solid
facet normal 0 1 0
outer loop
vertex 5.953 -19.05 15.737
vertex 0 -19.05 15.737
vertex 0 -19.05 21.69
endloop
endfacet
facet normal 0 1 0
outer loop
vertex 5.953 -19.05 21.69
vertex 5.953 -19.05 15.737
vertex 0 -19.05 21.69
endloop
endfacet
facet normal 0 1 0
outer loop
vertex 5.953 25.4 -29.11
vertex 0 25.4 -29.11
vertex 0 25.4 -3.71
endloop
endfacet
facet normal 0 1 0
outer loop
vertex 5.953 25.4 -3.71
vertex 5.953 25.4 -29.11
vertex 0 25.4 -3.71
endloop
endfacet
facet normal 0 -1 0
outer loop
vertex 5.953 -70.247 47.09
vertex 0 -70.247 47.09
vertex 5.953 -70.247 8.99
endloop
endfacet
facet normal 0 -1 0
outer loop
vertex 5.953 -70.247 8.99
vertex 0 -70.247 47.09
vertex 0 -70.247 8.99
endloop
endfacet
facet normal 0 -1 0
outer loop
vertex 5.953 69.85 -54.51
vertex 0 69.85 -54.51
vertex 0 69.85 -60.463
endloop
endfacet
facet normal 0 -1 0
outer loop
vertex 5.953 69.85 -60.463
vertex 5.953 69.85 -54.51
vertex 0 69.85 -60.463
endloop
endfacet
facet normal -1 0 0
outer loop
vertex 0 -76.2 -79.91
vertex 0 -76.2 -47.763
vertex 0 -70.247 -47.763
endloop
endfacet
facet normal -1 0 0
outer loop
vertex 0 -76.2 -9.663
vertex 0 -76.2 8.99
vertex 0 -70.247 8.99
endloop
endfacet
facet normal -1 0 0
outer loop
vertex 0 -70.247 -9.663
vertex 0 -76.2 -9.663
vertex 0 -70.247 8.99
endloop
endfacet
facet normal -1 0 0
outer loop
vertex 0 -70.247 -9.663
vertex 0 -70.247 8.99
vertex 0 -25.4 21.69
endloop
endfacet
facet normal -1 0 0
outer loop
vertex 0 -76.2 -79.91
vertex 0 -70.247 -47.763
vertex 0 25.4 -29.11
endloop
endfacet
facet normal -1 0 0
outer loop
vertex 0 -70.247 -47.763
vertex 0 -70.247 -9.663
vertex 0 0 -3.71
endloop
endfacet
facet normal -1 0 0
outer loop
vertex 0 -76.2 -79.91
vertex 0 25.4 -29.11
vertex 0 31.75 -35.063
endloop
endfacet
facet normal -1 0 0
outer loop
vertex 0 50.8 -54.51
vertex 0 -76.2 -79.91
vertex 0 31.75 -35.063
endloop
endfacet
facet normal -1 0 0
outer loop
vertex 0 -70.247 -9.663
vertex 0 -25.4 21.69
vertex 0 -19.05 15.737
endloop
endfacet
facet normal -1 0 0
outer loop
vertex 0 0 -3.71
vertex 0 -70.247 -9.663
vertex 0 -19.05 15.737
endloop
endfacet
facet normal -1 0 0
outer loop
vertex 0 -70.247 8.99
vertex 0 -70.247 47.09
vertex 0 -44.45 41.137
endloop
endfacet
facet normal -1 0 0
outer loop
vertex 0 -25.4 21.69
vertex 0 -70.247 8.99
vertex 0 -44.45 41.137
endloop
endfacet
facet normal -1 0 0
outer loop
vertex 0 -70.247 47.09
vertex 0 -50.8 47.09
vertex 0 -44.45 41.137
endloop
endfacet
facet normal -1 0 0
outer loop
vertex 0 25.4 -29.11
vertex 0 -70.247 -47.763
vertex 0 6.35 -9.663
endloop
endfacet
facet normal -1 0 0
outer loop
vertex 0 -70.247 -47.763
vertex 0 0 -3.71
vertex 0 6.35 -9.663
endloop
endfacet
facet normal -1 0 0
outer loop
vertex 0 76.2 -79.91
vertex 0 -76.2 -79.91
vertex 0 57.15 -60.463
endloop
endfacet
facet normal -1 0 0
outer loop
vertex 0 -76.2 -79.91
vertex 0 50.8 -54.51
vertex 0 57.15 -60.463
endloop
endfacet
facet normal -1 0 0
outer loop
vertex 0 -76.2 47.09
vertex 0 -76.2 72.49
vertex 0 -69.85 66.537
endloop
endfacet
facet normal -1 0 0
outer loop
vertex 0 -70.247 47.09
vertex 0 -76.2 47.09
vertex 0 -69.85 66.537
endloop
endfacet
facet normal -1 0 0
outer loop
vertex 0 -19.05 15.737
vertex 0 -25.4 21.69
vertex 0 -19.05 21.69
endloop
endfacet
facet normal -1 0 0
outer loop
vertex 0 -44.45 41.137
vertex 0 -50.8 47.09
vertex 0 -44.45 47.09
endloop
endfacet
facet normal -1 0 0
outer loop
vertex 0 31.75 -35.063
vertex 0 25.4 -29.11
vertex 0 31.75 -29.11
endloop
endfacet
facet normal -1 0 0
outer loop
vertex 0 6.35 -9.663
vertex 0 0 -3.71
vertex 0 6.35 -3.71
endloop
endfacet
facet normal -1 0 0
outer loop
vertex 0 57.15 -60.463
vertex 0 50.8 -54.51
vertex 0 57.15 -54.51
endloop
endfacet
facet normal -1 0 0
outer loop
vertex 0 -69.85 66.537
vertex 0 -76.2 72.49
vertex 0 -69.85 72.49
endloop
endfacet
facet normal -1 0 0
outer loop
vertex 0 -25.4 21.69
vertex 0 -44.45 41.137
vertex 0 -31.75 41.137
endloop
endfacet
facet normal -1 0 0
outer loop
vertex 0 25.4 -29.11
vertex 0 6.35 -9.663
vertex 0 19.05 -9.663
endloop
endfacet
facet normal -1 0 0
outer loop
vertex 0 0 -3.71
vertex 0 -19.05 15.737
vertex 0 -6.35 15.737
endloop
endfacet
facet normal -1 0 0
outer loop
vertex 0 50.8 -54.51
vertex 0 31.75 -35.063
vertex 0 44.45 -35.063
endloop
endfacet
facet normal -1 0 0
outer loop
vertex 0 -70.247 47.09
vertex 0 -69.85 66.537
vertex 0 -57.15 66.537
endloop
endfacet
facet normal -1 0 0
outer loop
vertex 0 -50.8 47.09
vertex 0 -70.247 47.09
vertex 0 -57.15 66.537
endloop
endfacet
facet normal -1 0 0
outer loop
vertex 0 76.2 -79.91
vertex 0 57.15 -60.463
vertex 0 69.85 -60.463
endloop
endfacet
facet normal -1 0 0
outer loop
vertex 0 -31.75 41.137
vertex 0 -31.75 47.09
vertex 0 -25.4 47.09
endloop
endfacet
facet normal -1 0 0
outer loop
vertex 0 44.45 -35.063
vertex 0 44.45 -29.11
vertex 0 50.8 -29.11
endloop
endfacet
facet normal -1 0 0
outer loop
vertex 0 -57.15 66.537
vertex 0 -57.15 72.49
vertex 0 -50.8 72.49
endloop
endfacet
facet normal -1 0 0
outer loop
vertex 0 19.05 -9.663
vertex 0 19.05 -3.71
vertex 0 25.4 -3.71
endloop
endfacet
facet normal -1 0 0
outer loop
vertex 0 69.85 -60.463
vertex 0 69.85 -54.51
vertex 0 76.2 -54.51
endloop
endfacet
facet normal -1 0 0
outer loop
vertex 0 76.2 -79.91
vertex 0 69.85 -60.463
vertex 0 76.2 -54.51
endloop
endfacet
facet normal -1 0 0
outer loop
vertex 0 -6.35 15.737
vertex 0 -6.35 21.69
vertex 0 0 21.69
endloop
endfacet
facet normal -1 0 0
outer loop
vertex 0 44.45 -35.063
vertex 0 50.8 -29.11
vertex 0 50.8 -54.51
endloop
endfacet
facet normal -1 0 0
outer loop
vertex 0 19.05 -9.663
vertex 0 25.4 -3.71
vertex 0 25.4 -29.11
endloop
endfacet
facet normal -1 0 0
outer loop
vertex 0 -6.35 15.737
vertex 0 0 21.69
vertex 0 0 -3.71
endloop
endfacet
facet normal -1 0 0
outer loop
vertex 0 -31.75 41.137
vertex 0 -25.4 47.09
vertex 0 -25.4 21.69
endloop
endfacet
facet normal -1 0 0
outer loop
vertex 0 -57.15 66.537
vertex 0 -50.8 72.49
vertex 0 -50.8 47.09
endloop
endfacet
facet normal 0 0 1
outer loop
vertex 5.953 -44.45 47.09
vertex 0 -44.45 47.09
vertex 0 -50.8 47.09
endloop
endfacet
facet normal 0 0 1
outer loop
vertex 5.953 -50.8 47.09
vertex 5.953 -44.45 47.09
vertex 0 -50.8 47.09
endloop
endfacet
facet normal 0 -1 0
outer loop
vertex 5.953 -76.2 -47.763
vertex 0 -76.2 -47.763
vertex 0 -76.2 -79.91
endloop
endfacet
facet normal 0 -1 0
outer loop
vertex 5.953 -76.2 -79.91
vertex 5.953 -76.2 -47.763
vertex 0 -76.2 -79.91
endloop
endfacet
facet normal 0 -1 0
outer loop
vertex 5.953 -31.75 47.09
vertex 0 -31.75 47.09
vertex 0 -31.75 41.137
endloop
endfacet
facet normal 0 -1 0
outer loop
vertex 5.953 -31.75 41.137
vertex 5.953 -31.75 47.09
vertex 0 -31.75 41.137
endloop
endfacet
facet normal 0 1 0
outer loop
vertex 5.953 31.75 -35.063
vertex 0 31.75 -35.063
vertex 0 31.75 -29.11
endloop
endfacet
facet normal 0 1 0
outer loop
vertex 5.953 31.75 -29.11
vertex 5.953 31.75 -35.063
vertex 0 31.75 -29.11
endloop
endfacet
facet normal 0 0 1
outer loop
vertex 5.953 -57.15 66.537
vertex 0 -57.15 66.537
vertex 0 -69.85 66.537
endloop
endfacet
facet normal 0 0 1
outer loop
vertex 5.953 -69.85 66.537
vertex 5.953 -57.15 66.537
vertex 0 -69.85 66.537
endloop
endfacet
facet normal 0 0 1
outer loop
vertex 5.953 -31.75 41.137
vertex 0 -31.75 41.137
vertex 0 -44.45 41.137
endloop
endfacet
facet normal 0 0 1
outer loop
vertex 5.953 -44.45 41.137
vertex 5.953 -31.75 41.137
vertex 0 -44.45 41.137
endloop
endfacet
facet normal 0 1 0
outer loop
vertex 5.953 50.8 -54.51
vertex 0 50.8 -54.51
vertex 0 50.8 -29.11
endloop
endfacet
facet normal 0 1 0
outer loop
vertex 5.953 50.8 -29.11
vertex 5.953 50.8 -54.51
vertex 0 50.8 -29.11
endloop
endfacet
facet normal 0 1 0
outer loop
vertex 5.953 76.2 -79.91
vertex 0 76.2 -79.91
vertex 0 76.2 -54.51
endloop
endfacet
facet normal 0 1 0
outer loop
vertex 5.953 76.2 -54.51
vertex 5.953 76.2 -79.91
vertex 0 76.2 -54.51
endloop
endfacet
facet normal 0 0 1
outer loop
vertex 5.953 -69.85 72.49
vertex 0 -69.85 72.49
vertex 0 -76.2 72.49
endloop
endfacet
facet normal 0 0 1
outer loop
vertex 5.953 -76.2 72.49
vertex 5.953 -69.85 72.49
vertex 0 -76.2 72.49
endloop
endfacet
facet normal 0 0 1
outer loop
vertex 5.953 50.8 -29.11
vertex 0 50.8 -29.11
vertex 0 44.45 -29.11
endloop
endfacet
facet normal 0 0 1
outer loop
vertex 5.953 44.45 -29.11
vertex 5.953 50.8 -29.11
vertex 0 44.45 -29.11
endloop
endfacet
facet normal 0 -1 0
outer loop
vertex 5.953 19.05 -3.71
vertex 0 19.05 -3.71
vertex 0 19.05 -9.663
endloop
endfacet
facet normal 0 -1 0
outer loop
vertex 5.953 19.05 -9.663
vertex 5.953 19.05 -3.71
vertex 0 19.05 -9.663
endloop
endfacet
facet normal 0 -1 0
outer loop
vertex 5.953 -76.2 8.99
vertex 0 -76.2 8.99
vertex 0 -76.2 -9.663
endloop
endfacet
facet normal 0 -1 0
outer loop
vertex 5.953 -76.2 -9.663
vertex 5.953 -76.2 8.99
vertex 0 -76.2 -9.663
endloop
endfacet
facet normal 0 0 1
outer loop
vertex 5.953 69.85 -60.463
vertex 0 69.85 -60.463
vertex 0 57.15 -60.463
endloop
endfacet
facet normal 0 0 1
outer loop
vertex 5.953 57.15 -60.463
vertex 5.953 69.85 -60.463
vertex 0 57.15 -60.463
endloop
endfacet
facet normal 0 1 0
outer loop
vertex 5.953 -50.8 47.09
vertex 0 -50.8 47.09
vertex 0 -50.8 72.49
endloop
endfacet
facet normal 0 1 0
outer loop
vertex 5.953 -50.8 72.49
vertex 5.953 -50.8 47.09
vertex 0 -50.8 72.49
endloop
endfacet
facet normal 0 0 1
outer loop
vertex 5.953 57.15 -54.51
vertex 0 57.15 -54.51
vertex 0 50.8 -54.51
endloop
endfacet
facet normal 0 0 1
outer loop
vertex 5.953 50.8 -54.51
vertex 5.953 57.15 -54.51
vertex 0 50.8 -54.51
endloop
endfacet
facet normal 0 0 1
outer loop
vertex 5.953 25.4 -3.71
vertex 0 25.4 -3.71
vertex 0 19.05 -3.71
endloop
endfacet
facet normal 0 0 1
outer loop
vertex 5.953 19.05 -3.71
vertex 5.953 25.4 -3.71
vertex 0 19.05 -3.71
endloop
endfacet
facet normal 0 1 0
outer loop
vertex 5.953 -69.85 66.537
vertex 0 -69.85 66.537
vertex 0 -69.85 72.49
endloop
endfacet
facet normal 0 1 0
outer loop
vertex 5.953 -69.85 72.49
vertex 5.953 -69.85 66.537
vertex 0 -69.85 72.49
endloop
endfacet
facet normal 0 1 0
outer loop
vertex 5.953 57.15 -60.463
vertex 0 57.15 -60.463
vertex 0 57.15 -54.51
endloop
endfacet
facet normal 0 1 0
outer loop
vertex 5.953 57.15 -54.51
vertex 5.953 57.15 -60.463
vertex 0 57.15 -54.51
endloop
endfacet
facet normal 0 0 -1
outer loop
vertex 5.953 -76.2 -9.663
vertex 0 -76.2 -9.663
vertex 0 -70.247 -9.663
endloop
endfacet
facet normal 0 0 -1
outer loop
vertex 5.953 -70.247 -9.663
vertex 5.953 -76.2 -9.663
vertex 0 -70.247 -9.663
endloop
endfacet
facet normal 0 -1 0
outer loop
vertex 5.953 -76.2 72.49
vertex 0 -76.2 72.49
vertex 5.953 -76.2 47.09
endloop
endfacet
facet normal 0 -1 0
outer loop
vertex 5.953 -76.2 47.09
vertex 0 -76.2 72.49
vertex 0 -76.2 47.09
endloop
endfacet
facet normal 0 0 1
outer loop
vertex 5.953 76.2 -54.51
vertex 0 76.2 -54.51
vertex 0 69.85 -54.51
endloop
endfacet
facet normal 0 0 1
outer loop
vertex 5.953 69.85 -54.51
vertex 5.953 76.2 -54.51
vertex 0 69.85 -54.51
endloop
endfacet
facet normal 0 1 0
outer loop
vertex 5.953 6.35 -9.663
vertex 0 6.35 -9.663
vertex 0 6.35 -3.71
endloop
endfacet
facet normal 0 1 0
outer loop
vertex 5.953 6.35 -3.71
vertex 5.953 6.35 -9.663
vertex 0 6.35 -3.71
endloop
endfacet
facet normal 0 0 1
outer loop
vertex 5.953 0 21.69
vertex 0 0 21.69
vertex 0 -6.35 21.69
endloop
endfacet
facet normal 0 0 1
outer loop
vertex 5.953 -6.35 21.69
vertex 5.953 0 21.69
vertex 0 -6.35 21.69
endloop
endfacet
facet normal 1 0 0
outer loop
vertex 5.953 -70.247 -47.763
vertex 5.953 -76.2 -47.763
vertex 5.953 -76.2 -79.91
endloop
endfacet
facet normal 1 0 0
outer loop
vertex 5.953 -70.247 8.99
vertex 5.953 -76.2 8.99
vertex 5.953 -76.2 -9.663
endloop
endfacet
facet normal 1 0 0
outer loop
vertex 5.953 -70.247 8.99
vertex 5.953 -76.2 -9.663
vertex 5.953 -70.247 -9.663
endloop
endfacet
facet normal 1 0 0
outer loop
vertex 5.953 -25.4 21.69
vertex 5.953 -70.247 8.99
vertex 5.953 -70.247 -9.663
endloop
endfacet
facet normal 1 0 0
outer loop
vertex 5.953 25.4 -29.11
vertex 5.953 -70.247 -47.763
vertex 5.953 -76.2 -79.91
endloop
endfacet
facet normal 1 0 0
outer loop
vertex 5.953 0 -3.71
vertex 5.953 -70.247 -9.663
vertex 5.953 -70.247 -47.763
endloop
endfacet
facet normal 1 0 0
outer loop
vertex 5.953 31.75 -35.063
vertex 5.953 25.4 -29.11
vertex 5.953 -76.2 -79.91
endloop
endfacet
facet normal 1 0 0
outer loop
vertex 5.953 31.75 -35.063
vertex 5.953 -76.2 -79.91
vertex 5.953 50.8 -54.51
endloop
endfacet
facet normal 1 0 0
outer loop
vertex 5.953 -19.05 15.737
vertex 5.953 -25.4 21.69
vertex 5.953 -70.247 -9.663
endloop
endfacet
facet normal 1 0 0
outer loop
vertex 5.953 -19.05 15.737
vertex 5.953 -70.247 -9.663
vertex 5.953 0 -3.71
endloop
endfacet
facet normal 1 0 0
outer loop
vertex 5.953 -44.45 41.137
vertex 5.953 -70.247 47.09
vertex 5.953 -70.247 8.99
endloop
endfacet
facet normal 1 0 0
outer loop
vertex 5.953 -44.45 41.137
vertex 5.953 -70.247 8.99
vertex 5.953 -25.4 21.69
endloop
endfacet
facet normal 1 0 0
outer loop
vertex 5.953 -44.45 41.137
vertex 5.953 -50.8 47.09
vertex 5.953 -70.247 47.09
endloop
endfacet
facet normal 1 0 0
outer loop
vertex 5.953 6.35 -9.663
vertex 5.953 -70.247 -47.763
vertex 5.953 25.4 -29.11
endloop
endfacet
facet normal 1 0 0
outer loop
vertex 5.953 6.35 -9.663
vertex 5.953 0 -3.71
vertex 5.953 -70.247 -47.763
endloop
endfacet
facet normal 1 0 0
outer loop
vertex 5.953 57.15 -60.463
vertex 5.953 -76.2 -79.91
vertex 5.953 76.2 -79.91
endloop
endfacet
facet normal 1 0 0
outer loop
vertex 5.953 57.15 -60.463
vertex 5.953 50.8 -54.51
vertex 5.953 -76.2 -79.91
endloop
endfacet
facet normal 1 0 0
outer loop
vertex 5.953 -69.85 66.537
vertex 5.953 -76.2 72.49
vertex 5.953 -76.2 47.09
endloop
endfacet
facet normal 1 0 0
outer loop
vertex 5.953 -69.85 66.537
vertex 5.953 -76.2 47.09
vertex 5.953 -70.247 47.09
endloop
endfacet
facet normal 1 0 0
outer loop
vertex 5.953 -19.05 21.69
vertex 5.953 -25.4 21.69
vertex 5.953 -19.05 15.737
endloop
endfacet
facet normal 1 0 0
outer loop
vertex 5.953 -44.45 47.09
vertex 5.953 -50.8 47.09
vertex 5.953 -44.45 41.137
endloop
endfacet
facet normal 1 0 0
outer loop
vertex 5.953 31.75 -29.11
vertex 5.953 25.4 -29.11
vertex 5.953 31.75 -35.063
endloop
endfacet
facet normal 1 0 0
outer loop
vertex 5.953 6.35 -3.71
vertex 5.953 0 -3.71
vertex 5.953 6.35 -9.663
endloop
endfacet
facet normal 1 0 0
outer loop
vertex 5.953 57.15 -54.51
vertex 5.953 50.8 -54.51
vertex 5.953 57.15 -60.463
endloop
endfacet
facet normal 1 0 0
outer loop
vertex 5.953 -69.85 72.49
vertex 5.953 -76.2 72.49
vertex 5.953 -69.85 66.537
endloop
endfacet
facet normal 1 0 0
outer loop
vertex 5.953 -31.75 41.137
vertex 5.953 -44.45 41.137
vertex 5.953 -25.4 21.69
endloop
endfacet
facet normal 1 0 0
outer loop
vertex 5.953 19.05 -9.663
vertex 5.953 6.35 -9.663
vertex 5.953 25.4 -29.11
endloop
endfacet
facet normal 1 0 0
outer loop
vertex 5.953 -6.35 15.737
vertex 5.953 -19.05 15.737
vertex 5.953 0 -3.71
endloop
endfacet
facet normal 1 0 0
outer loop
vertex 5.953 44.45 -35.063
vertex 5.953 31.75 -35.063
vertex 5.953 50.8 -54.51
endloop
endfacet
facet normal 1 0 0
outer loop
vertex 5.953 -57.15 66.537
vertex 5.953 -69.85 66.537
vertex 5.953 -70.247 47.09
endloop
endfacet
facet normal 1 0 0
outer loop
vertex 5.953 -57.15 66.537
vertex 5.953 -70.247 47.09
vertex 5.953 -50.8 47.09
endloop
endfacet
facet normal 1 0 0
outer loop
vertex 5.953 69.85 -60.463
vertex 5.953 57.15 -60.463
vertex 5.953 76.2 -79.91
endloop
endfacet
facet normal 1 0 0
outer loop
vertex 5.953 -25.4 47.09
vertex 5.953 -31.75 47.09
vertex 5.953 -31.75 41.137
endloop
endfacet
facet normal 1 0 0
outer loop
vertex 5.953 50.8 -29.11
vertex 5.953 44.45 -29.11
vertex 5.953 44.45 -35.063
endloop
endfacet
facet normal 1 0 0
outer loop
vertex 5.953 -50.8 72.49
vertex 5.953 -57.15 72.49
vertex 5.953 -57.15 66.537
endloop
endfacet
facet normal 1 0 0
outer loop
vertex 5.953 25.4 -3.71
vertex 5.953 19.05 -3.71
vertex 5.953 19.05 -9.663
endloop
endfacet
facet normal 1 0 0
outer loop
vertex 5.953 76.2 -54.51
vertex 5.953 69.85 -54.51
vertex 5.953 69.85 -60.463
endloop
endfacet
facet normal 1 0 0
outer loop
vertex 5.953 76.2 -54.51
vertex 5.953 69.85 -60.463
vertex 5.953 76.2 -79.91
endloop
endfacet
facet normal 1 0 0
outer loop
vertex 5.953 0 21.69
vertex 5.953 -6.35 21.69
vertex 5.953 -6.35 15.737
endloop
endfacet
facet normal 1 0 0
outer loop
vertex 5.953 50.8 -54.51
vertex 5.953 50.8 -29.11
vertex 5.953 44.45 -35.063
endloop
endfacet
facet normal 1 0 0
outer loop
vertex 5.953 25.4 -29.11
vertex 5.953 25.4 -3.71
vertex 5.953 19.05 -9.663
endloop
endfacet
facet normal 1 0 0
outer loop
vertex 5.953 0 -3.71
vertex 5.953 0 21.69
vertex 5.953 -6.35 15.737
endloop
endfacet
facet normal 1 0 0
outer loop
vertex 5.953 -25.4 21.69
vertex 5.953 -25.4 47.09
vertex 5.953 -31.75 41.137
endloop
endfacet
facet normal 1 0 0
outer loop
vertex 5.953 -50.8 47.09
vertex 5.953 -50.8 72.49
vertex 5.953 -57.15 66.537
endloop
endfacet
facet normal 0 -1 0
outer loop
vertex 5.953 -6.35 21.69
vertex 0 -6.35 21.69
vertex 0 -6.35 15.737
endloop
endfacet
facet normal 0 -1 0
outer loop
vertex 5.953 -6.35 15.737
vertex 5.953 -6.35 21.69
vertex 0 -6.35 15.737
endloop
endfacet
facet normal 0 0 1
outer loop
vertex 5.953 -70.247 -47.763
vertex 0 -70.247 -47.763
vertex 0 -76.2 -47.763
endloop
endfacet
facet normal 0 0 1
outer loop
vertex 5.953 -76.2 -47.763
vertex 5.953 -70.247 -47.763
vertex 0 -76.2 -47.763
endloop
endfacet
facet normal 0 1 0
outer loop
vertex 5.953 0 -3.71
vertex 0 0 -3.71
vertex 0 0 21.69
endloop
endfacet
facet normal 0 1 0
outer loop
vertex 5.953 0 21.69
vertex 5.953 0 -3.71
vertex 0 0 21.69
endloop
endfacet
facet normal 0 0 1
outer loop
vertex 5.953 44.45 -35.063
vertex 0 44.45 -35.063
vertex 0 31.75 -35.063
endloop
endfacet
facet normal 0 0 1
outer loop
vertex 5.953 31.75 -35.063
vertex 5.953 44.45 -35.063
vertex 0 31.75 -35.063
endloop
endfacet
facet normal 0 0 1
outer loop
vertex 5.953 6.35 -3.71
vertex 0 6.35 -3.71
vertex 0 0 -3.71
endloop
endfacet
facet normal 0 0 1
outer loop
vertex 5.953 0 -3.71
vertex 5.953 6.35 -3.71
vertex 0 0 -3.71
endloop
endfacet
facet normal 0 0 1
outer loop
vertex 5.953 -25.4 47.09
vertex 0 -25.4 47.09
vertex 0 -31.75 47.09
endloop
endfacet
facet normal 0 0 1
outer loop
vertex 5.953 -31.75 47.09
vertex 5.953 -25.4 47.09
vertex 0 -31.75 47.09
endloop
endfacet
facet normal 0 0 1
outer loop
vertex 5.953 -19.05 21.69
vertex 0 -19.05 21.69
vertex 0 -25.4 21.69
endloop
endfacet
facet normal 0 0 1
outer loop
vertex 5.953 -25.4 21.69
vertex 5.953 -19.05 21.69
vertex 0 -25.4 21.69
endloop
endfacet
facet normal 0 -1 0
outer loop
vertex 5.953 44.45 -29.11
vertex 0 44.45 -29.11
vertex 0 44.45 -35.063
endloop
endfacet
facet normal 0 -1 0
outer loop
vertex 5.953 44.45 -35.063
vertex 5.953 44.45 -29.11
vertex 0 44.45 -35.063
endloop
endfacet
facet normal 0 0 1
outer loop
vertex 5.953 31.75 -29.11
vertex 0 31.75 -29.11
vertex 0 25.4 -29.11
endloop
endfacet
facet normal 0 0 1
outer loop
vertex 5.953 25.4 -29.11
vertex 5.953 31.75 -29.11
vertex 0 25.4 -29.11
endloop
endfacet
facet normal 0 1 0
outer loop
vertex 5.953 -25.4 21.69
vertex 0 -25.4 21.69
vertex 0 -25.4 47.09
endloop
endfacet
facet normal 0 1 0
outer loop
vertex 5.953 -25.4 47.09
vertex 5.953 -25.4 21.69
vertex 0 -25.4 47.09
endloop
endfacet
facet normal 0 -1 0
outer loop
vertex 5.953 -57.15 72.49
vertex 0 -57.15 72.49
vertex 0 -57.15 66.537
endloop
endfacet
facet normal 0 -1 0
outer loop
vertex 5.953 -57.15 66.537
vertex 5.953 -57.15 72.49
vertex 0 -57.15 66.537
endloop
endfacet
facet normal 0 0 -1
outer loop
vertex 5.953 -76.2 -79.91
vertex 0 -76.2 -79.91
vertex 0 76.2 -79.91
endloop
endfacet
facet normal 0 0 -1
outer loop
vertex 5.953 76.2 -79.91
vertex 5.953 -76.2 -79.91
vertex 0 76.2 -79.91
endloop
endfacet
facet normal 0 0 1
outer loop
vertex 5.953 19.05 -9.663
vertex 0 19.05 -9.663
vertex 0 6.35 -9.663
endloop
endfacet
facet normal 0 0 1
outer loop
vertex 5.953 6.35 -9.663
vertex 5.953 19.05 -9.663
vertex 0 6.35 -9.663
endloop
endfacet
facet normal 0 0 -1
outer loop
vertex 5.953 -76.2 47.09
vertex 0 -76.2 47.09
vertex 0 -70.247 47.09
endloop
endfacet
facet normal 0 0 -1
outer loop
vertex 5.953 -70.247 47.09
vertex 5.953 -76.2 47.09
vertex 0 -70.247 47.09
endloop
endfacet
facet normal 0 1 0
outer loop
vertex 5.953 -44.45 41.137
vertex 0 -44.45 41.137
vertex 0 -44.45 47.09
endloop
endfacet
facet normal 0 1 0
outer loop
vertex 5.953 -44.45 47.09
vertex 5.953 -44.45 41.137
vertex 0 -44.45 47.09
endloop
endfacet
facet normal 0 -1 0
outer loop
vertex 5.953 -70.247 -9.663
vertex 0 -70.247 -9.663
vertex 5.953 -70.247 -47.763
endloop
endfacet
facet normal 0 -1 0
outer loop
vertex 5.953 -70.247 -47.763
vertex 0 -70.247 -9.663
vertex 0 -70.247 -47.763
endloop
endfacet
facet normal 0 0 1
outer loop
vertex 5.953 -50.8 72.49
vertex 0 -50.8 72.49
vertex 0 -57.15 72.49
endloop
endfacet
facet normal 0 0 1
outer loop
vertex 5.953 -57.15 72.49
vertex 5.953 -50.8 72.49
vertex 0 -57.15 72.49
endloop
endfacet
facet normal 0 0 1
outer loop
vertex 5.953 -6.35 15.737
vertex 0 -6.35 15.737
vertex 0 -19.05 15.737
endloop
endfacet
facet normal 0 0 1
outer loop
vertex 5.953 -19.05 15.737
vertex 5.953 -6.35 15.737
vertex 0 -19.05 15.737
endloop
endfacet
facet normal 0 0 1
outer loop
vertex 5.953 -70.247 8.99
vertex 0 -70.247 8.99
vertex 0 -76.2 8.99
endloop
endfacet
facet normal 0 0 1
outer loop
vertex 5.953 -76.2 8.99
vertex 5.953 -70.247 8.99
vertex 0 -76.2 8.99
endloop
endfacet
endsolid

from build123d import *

# Parameters (mm, degrees)
F1_DEPTH = 5.953125


with BuildPart() as f1:
    # F0 (on Right) → F1 (new body)
    with BuildSketch(Plane.YZ):
        Polygon((-69.85, 72.489666), (-76.2, 72.489666), (-76.2, 47.089666), (-70.246875, 47.089666), (-70.246875, 8.989666), (-76.2, 8.989666), (-76.2, -9.663459), (-70.246875, -9.663459), (-70.246875, -47.763459), (-76.2, -47.763459), (-76.2, -79.910334), (76.2, -79.910334), (76.2, -54.510334), (69.85, -54.510334), (69.85, -60.463459), (57.15, -60.463459), (57.15, -54.510334), (50.8, -54.510334), (50.8, -29.110334), (44.45, -29.110334), (44.45, -35.063459), (31.75, -35.063459), (31.75, -29.110334), (25.4, -29.110334), (25.4, -3.710334), (19.05, -3.710334), (19.05, -9.663459), (6.35, -9.663459), (6.35, -3.710334), (0, -3.710334), (0, 21.689666), (-6.35, 21.689666), (-6.35, 15.736541), (-19.05, 15.736541), (-19.05, 21.689666), (-25.4, 21.689666), (-25.4, 47.089666), (-31.75, 47.089666), (-31.75, 41.136541), (-44.45, 41.136541), (-44.45, 47.089666), (-50.8, 47.089666), (-50.8, 72.489666), (-57.15, 72.489666), (-57.15, 66.536541), (-69.85, 66.536541), align=None)
    extrude(amount=F1_DEPTH)


solid = f1.part
